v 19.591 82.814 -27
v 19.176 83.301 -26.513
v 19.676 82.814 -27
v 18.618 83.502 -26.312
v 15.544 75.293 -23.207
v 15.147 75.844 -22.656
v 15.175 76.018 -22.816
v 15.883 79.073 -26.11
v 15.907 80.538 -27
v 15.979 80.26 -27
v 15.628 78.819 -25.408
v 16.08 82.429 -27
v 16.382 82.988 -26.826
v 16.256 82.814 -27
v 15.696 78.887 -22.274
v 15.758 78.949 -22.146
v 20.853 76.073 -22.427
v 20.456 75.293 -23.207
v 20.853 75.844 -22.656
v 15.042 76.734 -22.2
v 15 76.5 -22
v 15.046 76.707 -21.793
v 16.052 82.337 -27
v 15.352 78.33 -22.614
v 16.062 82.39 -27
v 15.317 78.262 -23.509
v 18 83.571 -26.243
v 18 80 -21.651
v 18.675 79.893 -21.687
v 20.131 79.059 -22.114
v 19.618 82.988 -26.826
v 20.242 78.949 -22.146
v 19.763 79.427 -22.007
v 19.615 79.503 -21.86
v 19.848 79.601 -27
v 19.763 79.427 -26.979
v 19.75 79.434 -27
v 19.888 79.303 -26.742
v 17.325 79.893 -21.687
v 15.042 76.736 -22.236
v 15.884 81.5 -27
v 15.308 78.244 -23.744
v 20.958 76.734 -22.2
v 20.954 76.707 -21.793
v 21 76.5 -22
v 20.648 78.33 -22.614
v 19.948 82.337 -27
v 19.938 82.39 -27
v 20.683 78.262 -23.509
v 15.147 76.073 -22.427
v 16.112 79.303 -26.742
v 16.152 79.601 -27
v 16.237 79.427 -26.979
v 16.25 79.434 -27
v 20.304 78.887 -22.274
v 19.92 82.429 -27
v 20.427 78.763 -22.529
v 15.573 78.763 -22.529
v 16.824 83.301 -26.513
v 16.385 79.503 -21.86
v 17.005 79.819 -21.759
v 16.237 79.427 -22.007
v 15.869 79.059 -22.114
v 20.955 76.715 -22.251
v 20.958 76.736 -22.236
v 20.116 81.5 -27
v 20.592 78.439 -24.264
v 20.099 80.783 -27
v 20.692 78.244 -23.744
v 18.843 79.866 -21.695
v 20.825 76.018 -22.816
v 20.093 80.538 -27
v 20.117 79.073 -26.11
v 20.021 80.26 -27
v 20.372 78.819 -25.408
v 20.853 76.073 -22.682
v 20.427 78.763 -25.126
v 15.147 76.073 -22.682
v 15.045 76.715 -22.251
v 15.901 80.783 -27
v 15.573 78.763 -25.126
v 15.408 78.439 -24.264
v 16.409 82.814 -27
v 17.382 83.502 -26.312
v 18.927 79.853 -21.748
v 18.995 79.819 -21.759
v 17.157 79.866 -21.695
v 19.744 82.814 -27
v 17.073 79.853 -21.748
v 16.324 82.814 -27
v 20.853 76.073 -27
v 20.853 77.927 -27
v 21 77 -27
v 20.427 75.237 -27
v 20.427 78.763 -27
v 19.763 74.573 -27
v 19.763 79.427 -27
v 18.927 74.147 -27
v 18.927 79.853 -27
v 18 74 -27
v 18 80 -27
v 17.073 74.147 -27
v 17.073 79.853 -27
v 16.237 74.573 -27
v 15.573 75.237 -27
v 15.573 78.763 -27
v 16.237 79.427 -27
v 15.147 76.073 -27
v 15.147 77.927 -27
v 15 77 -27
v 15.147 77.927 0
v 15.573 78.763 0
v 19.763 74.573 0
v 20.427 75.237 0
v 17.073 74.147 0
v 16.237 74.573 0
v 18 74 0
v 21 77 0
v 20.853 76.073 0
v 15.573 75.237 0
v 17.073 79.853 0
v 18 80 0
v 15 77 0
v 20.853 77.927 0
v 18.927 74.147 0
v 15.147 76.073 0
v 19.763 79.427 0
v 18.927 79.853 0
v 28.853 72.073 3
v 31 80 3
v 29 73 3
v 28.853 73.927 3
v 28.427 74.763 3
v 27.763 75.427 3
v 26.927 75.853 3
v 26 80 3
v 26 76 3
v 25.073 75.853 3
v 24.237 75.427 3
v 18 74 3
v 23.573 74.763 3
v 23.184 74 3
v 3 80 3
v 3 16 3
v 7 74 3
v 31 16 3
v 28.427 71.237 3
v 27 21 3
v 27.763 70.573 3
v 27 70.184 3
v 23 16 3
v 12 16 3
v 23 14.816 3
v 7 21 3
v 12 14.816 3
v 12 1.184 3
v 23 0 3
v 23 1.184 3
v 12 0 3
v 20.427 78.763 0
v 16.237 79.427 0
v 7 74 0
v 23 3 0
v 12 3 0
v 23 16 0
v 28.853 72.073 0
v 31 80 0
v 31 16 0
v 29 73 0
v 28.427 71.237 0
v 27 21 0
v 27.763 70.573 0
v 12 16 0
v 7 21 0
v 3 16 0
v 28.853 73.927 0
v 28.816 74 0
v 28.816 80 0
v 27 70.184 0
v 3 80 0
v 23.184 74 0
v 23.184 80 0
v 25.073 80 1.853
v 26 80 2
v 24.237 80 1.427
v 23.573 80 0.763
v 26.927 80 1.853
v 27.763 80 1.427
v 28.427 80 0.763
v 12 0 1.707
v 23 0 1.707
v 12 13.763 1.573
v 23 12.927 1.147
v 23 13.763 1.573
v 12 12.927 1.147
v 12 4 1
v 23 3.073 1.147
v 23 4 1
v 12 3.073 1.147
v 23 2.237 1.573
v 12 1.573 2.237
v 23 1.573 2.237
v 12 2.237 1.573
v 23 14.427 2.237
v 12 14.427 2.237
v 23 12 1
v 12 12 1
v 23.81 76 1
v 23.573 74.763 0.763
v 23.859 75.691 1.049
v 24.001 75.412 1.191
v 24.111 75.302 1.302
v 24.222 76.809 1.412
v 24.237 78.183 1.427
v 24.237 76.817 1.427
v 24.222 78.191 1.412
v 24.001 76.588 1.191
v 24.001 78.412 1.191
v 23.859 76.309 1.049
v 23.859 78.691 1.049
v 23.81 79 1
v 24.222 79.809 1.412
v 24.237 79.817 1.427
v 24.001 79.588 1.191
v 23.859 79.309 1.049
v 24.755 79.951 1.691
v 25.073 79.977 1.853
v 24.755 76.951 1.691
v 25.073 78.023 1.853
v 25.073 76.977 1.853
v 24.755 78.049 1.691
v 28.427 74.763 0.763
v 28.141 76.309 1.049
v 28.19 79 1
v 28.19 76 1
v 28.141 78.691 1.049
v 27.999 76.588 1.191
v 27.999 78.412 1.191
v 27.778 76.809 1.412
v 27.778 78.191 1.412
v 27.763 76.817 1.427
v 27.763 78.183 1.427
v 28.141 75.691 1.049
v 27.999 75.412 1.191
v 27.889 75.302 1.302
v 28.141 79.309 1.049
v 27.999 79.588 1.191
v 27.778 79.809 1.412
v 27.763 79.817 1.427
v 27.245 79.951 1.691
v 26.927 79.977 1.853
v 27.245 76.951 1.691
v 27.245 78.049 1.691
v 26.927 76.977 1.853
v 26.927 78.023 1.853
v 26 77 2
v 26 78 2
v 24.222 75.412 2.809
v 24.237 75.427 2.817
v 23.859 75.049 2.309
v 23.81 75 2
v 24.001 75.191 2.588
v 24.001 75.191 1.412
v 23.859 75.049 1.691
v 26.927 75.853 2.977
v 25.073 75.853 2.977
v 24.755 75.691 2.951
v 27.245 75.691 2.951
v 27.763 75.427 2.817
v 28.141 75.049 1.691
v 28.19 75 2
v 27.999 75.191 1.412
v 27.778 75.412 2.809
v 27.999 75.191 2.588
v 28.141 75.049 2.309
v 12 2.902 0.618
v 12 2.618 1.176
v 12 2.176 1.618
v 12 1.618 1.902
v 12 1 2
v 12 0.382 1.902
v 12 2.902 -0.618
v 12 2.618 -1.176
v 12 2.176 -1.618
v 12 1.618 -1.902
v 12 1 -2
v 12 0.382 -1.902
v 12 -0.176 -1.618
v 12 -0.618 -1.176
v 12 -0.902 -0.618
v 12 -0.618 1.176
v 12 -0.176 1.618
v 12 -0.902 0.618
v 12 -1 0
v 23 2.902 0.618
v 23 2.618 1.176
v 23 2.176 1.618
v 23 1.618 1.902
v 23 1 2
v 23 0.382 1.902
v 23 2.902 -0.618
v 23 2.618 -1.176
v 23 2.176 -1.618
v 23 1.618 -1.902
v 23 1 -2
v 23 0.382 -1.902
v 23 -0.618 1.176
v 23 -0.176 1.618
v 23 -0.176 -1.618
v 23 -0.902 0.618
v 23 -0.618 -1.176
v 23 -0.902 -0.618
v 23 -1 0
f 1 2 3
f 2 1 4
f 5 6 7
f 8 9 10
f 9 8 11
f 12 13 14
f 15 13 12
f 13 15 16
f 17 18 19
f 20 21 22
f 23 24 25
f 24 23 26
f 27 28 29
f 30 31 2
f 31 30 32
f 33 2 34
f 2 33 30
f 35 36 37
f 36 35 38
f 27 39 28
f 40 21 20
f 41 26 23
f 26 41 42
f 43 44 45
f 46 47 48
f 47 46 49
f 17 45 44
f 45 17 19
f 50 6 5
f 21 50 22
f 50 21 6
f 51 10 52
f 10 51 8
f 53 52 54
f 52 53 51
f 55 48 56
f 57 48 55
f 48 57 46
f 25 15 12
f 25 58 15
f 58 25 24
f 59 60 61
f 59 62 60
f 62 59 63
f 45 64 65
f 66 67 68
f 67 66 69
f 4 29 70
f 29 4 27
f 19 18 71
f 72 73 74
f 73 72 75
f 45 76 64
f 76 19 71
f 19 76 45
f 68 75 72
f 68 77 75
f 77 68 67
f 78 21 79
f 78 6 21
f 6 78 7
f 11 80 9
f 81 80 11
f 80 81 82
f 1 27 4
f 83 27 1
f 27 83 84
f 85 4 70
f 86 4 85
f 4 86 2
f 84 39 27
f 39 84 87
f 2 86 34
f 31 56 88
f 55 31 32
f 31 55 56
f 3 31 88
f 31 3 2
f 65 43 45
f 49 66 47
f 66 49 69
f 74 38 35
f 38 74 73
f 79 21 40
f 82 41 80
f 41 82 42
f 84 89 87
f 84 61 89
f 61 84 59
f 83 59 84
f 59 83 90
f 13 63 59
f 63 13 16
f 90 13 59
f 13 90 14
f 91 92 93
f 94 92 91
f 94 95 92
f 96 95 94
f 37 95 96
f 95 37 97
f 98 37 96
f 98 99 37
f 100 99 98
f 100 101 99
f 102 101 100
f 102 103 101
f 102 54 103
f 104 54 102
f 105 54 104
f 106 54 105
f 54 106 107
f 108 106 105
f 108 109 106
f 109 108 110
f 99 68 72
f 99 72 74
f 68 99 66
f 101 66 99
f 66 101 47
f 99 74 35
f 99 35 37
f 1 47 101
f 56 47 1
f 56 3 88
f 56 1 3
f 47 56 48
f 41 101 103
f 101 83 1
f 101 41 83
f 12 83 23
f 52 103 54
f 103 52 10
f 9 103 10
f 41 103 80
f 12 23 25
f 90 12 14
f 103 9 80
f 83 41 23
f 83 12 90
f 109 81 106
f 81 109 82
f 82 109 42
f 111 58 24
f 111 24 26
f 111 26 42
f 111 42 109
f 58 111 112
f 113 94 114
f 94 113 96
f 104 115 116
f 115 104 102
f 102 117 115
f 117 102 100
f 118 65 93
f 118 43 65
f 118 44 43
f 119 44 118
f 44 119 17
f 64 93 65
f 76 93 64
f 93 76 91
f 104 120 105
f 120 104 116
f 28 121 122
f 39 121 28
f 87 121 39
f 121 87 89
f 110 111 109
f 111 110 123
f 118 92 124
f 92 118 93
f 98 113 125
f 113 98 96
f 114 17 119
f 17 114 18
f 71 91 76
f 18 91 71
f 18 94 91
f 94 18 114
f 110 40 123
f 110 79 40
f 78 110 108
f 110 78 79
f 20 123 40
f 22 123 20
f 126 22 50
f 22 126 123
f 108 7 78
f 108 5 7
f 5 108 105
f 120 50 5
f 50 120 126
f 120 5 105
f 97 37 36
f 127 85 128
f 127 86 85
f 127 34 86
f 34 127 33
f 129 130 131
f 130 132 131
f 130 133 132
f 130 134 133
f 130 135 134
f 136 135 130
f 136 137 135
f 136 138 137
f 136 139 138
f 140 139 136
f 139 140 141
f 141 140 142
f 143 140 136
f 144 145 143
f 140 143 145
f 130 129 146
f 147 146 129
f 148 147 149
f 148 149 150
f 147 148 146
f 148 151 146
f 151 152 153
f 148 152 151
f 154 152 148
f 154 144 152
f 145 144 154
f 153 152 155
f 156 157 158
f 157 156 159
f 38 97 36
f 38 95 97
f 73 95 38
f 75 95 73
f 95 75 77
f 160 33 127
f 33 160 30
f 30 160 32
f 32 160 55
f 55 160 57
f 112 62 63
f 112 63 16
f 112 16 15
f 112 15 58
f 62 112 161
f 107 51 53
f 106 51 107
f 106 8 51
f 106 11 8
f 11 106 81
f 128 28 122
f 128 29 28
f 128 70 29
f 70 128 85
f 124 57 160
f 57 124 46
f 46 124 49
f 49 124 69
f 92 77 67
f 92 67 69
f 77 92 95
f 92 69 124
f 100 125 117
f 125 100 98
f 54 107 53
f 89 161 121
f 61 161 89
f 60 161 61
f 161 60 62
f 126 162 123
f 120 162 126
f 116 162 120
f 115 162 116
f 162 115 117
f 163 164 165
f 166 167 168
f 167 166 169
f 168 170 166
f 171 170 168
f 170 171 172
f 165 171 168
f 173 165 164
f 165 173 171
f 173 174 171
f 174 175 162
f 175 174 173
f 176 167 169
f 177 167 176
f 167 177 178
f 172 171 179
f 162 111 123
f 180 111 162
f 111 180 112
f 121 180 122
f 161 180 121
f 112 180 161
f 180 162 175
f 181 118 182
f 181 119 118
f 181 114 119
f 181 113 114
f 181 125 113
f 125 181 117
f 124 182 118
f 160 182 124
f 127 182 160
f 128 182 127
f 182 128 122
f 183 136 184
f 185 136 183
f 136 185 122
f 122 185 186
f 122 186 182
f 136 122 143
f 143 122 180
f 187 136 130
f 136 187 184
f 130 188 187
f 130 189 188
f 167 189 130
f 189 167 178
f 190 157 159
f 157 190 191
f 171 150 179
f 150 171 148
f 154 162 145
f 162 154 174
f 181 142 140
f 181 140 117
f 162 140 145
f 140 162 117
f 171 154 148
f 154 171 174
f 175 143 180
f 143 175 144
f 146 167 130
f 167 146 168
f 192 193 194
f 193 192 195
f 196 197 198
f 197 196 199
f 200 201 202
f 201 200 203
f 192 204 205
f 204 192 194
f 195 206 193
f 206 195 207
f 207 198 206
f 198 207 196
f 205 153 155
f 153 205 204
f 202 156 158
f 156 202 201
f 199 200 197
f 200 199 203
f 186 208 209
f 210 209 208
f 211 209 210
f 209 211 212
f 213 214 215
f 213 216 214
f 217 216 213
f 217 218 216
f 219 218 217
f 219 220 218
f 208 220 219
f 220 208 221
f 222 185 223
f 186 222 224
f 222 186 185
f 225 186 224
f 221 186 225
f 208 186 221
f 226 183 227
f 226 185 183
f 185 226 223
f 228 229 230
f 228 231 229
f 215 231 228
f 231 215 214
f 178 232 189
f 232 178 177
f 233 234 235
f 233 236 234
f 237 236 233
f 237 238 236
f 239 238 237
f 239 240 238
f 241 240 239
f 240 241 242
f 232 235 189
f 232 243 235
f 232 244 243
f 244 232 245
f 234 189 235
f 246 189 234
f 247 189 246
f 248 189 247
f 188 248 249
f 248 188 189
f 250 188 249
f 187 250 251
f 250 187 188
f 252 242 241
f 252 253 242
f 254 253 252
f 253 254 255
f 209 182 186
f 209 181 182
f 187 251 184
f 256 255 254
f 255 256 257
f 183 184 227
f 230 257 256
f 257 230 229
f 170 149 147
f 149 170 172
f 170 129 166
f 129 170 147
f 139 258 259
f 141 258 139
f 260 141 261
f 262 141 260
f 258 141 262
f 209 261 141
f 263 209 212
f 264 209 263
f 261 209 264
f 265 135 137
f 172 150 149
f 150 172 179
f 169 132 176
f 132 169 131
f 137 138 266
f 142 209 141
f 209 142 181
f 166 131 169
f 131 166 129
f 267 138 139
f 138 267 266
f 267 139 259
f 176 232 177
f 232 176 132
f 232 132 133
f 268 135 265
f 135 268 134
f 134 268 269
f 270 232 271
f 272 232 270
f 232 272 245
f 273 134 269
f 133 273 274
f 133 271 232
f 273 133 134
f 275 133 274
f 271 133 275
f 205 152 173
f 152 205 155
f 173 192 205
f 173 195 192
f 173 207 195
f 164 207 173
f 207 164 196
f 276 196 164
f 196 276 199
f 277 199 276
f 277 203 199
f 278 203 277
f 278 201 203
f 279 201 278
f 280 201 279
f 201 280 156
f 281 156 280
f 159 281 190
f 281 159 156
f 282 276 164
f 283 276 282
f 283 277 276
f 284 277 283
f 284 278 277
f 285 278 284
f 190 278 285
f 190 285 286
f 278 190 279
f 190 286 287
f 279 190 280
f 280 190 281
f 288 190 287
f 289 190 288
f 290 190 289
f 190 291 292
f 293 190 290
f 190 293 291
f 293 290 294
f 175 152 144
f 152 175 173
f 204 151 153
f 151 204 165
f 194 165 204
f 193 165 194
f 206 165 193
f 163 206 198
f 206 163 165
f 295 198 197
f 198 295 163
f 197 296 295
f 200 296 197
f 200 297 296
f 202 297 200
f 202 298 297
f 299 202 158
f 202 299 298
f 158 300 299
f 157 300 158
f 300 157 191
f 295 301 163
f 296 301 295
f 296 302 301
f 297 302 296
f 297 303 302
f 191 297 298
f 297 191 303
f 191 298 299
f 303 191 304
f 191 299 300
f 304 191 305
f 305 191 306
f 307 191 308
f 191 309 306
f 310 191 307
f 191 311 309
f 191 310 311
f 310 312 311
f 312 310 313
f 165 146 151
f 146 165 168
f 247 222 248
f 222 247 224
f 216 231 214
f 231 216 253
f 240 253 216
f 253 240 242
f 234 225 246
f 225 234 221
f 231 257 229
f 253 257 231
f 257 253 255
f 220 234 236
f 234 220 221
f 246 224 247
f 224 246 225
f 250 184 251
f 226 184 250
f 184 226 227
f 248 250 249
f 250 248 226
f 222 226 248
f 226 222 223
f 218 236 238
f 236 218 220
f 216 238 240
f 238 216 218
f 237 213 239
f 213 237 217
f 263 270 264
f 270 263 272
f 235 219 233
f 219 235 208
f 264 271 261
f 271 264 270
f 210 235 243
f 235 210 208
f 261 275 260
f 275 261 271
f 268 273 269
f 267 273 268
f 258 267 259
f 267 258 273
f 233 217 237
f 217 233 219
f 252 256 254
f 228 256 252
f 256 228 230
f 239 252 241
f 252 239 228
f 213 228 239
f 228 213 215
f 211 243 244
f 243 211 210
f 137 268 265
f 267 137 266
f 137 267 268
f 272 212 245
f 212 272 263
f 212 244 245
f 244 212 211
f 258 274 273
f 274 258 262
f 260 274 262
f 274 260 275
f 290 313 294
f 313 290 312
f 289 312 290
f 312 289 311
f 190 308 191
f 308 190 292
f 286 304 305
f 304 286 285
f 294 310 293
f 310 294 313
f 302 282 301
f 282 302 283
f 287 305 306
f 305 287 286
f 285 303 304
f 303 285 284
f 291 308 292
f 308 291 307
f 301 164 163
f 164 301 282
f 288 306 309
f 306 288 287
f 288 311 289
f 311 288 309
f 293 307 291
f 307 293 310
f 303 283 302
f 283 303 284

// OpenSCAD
$fn=20;   // For persion of polygons


difference(){
union(){
translate([23,79,2]){  // fix1
rotate([0,90,0]){
    cylinder(6,r=1,1);
}}
translate([23,76,2]){  // fix2
rotate([0,90,0]){
    cylinder(6,r=1,1);
}}

translate([18,77,3]){ // trigger
rotate([0,90,90]){
rotate([0,90,0]){
    cylinder(30,r=3,3);
}}
difference(){
translate([0,-.5,-25]){ // trigger
rotate([0,90,90]){
rotate([0,45,0]){
    cylinder(8,r=2,3);
}}}
translate([-9,-9,-40]){ // trim trigger
cube([20,20,10]);
}}}

difference(){  //plate.
cube([34,80,3]);
translate([7,21,-10]){   // handle hole
cube([20,53,20]);
}
translate([-4,-5,-6]){  // 1 notch
    cube([15,20,15]);
}
translate([24,-5,-6]){  // 2 notch
    cube([15,20,15]);
}
translate([-1,-1,-1]){  // trimming sides of plate
cube([4,200,6]);
}
translate([31,-1,-1]){  // trimming sides of plate
cube([4,200,6]);
}
hull(){ // flex on the neck
translate([0,12,4]){
rotate([0,90,0]){
    cylinder(34,r=3,3);
}}
translate([0,4,4]){ 
rotate([0,90,0]){
    cylinder(34,r=3,3);
}}}
translate([26,73,-1]){ // grove
rotate([0,90,90]){
rotate([0,0,0]){
    cylinder(90,r=3,3);
}}}
translate([26,73,10]){ // hole
rotate([0,90,90]){
rotate([0,90,0]){
    cylinder(20,r=3,3);
}}}
translate([26,83,10]){ // hole
rotate([0,90,90]){
rotate([0,90,0]){
    cylinder(20,r=3,3);
}}}
translate([-8,-4,-10]){  //trim 1
cube([20,20,20]);
}

translate([23,-4,-10]){  //trim 2
cube([20,20,20]);
}
}

translate([12,1,0]){  // ramp
rotate([0,90,0]){
    cylinder(11,r=2,2);
}}
}

/*
translate([18,77,10]){ // hole in trigger
rotate([0,90,90]){
rotate([0,90,0]){
    cylinder(60,r=1,1);
}}}
*/
}
